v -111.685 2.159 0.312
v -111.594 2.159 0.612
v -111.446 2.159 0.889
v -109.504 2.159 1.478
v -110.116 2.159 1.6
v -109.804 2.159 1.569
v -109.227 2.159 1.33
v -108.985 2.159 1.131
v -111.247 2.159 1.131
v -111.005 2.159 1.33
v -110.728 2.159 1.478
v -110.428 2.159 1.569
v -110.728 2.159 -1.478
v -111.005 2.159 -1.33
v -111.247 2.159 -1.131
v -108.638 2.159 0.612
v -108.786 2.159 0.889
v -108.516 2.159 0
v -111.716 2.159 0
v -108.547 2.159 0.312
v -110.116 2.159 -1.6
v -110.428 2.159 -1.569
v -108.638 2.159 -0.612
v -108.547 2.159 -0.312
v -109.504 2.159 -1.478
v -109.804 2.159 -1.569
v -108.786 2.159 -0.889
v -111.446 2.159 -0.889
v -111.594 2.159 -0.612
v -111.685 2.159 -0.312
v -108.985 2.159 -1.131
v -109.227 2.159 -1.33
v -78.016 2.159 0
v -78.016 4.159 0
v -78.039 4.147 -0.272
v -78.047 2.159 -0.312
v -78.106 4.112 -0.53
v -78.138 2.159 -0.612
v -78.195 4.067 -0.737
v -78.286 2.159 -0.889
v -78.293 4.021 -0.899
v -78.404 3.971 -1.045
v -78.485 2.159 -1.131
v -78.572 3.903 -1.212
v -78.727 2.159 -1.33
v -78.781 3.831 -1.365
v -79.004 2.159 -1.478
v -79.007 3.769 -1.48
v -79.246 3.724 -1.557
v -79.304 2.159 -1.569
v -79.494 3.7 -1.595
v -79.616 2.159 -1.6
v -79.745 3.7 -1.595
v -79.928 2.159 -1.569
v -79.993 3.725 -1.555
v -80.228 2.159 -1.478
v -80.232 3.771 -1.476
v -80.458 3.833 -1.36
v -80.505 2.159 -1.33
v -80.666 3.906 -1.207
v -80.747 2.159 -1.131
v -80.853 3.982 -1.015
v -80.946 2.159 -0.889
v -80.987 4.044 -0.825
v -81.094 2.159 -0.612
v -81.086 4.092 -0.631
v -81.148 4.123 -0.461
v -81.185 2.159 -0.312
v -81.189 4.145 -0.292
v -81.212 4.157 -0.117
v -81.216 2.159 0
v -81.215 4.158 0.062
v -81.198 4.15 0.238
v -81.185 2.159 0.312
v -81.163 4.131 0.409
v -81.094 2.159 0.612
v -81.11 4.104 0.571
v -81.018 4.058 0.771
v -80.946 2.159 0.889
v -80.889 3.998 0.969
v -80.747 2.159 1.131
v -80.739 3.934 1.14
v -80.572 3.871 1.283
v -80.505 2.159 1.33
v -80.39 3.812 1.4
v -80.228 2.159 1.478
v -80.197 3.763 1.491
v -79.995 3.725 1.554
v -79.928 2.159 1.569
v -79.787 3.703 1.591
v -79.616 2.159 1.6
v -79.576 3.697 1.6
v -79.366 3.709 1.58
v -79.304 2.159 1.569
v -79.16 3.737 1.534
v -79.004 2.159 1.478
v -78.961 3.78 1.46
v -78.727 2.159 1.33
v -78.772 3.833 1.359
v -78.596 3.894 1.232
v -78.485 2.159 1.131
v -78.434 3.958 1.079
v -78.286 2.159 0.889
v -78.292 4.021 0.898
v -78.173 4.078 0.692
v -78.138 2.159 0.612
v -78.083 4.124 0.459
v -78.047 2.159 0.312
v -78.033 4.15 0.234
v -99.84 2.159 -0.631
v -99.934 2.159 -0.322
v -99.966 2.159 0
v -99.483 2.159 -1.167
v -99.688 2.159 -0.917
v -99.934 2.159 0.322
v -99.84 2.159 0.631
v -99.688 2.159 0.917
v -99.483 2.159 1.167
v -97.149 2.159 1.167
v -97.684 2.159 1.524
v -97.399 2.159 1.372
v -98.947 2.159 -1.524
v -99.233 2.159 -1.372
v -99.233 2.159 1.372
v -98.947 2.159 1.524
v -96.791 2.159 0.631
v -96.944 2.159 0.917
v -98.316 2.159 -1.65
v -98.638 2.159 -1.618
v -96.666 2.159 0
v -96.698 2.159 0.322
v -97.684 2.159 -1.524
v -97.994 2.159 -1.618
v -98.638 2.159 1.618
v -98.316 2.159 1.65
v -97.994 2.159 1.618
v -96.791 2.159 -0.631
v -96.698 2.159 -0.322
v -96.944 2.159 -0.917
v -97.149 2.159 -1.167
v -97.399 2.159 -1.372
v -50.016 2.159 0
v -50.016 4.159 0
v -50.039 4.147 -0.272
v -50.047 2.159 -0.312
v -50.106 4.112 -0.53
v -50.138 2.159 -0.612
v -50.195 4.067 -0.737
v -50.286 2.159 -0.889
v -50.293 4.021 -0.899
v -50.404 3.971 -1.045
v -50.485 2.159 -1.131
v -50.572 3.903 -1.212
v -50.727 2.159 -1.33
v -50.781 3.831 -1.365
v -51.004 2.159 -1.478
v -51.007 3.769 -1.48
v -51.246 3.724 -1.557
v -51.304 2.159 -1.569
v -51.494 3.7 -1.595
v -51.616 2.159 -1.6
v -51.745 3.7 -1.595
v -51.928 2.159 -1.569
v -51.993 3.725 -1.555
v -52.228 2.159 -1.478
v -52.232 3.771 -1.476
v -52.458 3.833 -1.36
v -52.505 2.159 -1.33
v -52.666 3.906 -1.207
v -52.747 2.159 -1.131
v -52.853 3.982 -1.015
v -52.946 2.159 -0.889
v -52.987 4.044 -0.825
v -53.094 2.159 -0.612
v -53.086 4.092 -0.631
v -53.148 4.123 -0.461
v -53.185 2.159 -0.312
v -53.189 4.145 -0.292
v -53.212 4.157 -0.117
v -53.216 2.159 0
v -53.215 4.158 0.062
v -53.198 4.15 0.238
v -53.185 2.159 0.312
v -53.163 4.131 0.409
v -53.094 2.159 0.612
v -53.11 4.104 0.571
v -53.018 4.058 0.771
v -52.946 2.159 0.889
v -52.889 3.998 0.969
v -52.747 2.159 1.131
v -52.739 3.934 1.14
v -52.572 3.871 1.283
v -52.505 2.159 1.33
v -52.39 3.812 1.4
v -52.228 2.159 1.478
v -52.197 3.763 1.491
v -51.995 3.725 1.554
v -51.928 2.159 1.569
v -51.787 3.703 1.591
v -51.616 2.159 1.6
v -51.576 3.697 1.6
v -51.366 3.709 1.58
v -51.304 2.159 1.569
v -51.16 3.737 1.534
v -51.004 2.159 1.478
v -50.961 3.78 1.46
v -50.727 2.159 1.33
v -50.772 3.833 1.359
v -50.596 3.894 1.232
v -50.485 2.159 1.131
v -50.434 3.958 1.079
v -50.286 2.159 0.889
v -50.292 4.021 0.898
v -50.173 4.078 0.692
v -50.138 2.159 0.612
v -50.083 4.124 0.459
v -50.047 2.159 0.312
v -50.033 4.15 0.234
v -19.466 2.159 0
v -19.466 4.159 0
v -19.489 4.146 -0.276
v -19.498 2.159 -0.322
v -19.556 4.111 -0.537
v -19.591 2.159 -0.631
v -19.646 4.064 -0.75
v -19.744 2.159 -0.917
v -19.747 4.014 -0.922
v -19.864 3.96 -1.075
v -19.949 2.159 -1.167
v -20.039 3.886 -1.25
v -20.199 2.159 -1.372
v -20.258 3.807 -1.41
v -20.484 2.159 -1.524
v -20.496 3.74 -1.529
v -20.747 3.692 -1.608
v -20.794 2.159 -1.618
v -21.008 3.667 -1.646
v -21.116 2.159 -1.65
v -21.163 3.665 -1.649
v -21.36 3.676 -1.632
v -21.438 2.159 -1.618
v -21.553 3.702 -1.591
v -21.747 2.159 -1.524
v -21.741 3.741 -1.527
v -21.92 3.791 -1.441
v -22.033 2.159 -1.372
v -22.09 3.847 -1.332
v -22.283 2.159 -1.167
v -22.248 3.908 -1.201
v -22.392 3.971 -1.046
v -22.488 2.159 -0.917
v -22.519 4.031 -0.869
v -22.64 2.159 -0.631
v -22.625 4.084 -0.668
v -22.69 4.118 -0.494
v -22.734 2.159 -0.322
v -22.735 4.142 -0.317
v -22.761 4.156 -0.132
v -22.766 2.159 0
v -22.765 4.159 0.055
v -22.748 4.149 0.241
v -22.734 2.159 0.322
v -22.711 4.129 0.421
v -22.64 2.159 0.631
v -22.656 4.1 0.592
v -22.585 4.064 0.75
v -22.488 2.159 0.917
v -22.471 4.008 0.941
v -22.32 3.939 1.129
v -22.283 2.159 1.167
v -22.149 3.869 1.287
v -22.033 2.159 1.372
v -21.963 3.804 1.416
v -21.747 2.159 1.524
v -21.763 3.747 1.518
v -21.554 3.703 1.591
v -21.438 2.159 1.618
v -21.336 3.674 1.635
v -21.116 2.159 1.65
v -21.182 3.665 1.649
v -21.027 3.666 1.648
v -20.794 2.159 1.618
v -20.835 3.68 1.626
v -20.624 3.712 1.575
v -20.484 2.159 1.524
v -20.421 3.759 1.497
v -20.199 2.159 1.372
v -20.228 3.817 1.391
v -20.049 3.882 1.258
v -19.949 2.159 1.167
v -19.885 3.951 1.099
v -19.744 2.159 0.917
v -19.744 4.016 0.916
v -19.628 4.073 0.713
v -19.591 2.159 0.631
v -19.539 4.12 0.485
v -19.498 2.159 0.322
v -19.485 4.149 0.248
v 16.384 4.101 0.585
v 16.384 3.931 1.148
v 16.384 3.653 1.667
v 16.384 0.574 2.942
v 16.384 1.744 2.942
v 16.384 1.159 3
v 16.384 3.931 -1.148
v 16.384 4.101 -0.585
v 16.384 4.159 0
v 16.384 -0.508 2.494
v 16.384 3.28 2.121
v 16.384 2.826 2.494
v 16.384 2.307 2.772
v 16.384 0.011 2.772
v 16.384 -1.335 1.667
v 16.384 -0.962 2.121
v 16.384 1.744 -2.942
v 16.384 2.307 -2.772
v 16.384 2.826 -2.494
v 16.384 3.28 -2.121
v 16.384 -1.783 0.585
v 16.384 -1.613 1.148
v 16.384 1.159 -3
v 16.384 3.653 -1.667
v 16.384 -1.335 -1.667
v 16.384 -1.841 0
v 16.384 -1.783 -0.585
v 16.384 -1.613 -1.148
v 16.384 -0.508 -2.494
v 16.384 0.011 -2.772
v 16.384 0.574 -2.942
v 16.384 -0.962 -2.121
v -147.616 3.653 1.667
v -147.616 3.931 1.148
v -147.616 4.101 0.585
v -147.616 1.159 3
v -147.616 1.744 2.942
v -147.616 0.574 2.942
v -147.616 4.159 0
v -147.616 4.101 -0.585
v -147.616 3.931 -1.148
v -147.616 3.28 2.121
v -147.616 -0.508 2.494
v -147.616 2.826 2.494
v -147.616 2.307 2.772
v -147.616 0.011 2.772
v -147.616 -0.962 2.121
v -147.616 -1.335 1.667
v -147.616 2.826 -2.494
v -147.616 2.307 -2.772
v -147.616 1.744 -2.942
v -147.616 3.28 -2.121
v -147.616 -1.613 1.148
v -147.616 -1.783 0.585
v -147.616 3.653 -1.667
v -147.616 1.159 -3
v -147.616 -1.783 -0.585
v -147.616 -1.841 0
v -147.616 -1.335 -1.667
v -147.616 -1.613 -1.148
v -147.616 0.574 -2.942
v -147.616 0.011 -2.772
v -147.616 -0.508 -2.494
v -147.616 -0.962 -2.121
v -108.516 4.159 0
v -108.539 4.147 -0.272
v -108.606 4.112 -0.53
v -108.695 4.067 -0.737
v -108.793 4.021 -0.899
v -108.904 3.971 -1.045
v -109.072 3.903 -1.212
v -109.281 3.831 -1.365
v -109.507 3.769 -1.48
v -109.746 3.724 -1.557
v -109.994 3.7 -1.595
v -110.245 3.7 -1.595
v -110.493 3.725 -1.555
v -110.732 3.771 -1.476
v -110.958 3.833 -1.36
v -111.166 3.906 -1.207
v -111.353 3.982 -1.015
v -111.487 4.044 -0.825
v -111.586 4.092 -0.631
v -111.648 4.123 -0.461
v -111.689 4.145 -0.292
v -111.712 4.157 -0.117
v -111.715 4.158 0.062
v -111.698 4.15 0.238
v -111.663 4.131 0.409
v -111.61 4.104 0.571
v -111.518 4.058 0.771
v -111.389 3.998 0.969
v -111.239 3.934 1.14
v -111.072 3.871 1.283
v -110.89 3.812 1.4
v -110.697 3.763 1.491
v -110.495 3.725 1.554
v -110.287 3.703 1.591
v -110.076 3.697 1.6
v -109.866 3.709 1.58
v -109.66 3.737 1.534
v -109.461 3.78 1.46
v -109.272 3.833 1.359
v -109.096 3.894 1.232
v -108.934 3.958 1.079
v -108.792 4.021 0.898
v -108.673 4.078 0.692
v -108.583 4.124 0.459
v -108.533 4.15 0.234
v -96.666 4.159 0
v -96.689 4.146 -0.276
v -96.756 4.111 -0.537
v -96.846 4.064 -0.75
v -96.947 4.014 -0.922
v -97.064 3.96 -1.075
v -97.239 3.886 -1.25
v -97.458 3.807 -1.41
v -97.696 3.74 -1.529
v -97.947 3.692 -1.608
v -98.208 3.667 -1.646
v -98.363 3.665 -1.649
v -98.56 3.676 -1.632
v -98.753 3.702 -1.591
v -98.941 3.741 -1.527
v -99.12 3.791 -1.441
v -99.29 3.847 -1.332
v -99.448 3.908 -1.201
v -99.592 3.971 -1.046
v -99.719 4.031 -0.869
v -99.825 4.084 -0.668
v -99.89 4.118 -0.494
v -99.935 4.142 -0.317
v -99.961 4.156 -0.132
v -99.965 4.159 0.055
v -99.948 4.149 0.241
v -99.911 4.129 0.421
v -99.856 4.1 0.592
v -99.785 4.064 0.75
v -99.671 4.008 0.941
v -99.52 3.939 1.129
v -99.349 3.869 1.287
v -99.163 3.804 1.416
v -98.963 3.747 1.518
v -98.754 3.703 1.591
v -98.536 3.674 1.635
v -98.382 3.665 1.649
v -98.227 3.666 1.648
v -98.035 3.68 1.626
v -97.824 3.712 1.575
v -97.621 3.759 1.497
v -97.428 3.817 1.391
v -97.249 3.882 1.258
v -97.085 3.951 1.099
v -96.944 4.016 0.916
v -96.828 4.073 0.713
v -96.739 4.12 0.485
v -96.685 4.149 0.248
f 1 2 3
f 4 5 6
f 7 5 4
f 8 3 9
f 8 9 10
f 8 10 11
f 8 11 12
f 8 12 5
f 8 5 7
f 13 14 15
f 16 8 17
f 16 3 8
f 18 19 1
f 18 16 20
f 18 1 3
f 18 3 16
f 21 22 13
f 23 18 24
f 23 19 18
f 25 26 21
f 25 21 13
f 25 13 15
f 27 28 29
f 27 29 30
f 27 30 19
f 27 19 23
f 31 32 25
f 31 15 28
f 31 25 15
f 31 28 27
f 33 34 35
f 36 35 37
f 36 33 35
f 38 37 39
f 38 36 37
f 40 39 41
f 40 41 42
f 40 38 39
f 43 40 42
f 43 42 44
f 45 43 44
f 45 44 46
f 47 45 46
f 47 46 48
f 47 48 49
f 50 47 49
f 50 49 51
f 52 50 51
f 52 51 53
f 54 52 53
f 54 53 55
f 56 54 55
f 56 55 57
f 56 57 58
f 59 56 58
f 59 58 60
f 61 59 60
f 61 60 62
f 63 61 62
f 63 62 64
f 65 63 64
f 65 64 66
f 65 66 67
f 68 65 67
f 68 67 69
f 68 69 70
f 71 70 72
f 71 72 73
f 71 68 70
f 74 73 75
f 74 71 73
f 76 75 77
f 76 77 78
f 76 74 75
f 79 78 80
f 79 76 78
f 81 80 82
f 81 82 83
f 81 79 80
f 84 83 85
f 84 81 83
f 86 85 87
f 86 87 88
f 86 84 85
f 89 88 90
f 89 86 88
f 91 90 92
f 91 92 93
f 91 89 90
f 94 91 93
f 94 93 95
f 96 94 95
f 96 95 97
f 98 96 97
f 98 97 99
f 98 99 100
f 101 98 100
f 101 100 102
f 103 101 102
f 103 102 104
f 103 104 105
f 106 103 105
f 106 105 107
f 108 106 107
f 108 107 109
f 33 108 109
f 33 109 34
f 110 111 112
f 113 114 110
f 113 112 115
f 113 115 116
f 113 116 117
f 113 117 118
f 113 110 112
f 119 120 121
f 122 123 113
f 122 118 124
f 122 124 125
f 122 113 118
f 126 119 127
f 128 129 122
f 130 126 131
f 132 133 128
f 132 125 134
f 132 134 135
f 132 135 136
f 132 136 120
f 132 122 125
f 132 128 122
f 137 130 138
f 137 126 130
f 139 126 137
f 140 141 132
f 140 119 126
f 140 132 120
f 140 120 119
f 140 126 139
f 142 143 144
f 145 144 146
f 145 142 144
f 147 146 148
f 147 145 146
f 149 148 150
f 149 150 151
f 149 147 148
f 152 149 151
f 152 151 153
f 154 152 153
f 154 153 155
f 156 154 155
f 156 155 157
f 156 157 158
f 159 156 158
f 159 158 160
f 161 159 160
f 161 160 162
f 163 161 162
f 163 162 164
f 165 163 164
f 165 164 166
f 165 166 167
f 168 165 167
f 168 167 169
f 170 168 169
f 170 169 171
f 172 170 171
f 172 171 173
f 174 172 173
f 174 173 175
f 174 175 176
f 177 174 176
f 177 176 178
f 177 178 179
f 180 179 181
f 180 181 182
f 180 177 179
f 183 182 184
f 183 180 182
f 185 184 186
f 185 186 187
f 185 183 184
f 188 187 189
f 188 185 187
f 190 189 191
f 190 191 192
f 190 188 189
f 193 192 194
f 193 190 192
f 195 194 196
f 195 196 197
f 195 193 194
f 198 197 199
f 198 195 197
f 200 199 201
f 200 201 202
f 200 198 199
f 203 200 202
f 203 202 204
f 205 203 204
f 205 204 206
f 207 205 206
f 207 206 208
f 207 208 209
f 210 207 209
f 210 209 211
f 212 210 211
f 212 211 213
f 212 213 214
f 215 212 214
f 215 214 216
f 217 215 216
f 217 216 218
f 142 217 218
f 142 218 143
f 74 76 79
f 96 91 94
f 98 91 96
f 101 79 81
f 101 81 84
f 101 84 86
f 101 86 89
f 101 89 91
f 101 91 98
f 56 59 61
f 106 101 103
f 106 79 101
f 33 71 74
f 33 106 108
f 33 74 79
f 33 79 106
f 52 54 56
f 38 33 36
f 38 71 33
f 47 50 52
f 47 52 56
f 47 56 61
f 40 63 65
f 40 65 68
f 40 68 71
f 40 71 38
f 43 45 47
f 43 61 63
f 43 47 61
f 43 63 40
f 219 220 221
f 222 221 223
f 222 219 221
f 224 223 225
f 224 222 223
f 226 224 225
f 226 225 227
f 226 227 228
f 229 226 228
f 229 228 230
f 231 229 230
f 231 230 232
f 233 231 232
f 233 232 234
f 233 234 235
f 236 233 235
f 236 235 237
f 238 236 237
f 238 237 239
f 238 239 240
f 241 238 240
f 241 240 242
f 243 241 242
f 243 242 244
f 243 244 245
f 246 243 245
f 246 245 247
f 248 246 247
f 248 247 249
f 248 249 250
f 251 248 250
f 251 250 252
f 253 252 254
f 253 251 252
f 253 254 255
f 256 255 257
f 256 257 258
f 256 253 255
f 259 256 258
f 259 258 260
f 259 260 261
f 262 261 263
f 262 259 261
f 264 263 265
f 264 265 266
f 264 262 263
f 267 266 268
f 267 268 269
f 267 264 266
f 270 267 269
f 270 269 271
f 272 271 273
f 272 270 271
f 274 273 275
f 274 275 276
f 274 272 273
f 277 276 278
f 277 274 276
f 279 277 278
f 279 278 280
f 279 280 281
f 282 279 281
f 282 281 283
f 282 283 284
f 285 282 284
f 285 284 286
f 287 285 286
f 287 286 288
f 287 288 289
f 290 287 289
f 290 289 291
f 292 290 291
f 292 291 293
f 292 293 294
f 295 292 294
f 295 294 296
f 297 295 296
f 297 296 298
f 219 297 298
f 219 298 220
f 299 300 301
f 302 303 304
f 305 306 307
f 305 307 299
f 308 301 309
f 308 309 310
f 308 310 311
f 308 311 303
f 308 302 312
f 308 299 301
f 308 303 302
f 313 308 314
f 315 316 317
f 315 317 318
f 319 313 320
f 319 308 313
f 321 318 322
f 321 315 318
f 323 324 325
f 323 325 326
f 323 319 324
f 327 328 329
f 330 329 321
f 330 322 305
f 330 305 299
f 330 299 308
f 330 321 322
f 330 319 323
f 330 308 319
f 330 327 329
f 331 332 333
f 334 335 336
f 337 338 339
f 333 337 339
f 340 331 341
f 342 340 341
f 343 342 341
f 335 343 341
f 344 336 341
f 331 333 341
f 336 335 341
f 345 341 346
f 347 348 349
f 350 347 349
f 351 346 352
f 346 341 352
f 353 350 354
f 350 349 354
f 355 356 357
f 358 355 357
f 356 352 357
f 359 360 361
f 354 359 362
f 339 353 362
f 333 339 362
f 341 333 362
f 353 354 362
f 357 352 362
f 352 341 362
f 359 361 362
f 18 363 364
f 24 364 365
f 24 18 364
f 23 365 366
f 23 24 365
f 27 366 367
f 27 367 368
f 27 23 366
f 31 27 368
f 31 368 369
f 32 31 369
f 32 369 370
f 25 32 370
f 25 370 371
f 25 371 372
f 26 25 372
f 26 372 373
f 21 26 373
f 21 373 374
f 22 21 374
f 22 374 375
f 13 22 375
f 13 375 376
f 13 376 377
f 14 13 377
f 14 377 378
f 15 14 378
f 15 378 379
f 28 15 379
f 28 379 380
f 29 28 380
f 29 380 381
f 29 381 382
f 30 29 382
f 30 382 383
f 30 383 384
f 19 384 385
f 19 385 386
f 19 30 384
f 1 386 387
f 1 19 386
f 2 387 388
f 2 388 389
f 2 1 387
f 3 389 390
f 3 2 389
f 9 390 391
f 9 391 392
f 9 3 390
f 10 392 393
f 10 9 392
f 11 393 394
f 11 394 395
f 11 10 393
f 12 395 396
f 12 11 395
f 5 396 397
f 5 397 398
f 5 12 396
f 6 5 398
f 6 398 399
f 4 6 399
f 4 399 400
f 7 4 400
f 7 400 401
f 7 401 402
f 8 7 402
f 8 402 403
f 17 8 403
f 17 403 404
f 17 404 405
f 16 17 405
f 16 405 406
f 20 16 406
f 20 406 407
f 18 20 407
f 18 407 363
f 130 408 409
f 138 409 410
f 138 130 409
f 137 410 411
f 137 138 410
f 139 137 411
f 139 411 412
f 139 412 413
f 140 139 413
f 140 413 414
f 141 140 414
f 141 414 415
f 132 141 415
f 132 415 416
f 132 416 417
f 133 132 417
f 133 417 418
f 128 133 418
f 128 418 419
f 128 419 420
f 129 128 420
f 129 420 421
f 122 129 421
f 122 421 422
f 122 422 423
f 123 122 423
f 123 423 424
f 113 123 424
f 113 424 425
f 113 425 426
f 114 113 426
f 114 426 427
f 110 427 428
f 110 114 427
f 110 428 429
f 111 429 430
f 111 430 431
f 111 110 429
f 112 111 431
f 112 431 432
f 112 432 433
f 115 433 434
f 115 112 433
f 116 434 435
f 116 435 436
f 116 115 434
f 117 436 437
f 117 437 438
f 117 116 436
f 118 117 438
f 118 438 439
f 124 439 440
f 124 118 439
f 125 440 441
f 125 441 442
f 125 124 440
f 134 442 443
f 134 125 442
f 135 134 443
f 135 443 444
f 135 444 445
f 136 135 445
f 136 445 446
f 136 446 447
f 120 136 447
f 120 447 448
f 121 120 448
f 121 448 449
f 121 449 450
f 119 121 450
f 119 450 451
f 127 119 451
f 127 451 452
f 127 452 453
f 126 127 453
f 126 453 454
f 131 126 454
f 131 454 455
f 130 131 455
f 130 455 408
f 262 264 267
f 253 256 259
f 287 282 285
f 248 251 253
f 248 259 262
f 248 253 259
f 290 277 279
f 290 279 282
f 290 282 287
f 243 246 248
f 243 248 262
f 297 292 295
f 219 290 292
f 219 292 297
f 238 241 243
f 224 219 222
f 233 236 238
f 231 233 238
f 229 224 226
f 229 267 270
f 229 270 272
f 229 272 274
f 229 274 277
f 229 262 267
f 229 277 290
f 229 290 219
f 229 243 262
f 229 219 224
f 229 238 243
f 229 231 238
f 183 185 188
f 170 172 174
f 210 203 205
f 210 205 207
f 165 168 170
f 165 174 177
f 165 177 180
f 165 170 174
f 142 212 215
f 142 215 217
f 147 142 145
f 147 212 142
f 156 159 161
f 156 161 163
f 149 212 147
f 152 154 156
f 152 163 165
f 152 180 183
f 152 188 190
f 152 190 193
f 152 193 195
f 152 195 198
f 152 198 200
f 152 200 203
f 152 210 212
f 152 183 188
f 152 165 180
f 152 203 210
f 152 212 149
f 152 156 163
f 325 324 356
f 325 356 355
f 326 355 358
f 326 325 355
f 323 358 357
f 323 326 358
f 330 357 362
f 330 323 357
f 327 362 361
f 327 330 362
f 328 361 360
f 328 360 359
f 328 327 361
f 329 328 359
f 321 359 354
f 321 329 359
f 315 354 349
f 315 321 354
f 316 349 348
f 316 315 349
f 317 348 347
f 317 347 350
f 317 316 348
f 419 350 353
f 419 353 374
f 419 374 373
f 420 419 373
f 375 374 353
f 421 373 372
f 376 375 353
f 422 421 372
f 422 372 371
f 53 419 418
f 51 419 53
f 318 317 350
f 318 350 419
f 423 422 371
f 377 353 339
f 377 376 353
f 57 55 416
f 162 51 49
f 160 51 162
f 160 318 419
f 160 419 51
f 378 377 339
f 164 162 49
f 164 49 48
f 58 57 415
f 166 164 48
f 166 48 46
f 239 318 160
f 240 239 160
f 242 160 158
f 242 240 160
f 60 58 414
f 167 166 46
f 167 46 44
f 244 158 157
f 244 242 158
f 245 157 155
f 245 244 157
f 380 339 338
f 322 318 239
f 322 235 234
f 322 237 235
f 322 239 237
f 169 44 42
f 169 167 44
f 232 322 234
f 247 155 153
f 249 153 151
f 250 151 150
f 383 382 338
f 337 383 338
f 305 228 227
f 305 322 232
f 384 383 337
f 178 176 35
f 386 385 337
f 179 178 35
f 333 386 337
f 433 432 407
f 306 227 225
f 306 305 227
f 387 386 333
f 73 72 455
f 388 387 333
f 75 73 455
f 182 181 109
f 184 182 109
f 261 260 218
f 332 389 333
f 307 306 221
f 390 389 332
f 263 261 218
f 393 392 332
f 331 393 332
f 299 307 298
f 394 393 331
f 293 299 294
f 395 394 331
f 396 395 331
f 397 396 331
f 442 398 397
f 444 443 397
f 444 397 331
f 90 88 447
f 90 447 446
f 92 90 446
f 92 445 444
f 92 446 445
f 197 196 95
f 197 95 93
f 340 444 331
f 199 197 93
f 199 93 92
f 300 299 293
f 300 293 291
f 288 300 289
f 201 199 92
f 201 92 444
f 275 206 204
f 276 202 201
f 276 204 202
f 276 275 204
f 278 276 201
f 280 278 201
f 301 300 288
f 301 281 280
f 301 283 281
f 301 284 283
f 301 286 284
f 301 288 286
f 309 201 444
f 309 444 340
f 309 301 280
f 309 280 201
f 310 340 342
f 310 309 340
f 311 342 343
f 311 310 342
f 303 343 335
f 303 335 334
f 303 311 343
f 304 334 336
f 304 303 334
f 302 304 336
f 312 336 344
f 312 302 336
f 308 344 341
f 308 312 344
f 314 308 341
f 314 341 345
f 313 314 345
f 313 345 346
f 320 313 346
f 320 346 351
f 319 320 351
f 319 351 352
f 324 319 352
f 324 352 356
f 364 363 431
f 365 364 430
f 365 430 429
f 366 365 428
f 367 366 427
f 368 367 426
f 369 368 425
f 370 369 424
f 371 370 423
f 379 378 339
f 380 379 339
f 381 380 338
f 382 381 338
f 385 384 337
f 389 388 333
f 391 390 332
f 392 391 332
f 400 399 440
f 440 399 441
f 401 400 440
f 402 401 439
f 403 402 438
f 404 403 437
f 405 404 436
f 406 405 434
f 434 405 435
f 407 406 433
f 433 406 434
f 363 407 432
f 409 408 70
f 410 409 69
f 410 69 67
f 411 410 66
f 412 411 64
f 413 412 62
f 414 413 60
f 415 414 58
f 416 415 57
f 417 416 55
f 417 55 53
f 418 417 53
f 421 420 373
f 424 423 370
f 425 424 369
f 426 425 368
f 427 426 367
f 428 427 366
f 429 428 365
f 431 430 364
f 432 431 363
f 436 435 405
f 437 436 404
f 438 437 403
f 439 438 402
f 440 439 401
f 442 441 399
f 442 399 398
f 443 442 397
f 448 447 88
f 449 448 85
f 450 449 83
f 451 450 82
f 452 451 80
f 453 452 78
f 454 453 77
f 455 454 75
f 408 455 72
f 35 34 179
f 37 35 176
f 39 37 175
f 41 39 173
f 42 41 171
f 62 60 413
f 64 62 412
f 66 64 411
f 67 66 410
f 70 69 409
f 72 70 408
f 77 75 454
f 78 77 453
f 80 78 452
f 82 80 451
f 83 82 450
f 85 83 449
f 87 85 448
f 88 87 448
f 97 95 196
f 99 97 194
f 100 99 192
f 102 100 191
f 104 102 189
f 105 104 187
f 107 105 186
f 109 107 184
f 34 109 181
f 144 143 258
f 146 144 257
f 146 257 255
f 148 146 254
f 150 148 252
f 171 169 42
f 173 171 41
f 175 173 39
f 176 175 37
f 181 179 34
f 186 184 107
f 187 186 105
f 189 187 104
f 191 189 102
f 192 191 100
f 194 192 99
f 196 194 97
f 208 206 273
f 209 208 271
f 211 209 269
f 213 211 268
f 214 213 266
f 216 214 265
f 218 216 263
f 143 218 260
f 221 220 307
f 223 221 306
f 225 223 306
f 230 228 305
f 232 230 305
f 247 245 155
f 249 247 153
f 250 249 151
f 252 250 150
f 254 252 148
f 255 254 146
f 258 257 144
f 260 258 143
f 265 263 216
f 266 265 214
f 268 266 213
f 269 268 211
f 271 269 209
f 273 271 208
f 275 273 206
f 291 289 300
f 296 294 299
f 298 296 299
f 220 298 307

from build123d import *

# Parameters (mm, degrees)
SKETCH1_W          = 164
SKETCH1_H          = 3
SKETCH3_R          = 1.6
SKETCH3_R_2        = 1.65
CUT_EXTRUDE3_DEPTH = 2


with BuildPart() as part:
    # Sketch1 → Revolve1 (revolve)
    with BuildSketch(Plane.XY):
        with Locations((-65.615874943, -0.340909091)):
            Rectangle(SKETCH1_W, SKETCH1_H)
    revolve(axis=Axis((-147.615874943, 1.159090909, 0), (1, 0, 0)))

    # Sketch3 → Cut-Extrude3 (cut)
    with BuildSketch(Plane(origin=(16.384125057, 4.159090909, 0), x_dir=(1, 0, 0), z_dir=(0, 1, 0))):
        with Locations((-126.5, 0)):
            Circle(SKETCH3_R)
        with Locations((-114.7, 0)):
            Circle(SKETCH3_R_2)
        with Locations((-37.5, 0)):
            Circle(SKETCH3_R_2)
        with Locations((-96, 0)):
            Circle(SKETCH3_R)
        with Locations((-68, 0)):
            Circle(SKETCH3_R)
    extrude(amount=-CUT_EXTRUDE3_DEPTH, mode=Mode.SUBTRACT)


solid = part.part
